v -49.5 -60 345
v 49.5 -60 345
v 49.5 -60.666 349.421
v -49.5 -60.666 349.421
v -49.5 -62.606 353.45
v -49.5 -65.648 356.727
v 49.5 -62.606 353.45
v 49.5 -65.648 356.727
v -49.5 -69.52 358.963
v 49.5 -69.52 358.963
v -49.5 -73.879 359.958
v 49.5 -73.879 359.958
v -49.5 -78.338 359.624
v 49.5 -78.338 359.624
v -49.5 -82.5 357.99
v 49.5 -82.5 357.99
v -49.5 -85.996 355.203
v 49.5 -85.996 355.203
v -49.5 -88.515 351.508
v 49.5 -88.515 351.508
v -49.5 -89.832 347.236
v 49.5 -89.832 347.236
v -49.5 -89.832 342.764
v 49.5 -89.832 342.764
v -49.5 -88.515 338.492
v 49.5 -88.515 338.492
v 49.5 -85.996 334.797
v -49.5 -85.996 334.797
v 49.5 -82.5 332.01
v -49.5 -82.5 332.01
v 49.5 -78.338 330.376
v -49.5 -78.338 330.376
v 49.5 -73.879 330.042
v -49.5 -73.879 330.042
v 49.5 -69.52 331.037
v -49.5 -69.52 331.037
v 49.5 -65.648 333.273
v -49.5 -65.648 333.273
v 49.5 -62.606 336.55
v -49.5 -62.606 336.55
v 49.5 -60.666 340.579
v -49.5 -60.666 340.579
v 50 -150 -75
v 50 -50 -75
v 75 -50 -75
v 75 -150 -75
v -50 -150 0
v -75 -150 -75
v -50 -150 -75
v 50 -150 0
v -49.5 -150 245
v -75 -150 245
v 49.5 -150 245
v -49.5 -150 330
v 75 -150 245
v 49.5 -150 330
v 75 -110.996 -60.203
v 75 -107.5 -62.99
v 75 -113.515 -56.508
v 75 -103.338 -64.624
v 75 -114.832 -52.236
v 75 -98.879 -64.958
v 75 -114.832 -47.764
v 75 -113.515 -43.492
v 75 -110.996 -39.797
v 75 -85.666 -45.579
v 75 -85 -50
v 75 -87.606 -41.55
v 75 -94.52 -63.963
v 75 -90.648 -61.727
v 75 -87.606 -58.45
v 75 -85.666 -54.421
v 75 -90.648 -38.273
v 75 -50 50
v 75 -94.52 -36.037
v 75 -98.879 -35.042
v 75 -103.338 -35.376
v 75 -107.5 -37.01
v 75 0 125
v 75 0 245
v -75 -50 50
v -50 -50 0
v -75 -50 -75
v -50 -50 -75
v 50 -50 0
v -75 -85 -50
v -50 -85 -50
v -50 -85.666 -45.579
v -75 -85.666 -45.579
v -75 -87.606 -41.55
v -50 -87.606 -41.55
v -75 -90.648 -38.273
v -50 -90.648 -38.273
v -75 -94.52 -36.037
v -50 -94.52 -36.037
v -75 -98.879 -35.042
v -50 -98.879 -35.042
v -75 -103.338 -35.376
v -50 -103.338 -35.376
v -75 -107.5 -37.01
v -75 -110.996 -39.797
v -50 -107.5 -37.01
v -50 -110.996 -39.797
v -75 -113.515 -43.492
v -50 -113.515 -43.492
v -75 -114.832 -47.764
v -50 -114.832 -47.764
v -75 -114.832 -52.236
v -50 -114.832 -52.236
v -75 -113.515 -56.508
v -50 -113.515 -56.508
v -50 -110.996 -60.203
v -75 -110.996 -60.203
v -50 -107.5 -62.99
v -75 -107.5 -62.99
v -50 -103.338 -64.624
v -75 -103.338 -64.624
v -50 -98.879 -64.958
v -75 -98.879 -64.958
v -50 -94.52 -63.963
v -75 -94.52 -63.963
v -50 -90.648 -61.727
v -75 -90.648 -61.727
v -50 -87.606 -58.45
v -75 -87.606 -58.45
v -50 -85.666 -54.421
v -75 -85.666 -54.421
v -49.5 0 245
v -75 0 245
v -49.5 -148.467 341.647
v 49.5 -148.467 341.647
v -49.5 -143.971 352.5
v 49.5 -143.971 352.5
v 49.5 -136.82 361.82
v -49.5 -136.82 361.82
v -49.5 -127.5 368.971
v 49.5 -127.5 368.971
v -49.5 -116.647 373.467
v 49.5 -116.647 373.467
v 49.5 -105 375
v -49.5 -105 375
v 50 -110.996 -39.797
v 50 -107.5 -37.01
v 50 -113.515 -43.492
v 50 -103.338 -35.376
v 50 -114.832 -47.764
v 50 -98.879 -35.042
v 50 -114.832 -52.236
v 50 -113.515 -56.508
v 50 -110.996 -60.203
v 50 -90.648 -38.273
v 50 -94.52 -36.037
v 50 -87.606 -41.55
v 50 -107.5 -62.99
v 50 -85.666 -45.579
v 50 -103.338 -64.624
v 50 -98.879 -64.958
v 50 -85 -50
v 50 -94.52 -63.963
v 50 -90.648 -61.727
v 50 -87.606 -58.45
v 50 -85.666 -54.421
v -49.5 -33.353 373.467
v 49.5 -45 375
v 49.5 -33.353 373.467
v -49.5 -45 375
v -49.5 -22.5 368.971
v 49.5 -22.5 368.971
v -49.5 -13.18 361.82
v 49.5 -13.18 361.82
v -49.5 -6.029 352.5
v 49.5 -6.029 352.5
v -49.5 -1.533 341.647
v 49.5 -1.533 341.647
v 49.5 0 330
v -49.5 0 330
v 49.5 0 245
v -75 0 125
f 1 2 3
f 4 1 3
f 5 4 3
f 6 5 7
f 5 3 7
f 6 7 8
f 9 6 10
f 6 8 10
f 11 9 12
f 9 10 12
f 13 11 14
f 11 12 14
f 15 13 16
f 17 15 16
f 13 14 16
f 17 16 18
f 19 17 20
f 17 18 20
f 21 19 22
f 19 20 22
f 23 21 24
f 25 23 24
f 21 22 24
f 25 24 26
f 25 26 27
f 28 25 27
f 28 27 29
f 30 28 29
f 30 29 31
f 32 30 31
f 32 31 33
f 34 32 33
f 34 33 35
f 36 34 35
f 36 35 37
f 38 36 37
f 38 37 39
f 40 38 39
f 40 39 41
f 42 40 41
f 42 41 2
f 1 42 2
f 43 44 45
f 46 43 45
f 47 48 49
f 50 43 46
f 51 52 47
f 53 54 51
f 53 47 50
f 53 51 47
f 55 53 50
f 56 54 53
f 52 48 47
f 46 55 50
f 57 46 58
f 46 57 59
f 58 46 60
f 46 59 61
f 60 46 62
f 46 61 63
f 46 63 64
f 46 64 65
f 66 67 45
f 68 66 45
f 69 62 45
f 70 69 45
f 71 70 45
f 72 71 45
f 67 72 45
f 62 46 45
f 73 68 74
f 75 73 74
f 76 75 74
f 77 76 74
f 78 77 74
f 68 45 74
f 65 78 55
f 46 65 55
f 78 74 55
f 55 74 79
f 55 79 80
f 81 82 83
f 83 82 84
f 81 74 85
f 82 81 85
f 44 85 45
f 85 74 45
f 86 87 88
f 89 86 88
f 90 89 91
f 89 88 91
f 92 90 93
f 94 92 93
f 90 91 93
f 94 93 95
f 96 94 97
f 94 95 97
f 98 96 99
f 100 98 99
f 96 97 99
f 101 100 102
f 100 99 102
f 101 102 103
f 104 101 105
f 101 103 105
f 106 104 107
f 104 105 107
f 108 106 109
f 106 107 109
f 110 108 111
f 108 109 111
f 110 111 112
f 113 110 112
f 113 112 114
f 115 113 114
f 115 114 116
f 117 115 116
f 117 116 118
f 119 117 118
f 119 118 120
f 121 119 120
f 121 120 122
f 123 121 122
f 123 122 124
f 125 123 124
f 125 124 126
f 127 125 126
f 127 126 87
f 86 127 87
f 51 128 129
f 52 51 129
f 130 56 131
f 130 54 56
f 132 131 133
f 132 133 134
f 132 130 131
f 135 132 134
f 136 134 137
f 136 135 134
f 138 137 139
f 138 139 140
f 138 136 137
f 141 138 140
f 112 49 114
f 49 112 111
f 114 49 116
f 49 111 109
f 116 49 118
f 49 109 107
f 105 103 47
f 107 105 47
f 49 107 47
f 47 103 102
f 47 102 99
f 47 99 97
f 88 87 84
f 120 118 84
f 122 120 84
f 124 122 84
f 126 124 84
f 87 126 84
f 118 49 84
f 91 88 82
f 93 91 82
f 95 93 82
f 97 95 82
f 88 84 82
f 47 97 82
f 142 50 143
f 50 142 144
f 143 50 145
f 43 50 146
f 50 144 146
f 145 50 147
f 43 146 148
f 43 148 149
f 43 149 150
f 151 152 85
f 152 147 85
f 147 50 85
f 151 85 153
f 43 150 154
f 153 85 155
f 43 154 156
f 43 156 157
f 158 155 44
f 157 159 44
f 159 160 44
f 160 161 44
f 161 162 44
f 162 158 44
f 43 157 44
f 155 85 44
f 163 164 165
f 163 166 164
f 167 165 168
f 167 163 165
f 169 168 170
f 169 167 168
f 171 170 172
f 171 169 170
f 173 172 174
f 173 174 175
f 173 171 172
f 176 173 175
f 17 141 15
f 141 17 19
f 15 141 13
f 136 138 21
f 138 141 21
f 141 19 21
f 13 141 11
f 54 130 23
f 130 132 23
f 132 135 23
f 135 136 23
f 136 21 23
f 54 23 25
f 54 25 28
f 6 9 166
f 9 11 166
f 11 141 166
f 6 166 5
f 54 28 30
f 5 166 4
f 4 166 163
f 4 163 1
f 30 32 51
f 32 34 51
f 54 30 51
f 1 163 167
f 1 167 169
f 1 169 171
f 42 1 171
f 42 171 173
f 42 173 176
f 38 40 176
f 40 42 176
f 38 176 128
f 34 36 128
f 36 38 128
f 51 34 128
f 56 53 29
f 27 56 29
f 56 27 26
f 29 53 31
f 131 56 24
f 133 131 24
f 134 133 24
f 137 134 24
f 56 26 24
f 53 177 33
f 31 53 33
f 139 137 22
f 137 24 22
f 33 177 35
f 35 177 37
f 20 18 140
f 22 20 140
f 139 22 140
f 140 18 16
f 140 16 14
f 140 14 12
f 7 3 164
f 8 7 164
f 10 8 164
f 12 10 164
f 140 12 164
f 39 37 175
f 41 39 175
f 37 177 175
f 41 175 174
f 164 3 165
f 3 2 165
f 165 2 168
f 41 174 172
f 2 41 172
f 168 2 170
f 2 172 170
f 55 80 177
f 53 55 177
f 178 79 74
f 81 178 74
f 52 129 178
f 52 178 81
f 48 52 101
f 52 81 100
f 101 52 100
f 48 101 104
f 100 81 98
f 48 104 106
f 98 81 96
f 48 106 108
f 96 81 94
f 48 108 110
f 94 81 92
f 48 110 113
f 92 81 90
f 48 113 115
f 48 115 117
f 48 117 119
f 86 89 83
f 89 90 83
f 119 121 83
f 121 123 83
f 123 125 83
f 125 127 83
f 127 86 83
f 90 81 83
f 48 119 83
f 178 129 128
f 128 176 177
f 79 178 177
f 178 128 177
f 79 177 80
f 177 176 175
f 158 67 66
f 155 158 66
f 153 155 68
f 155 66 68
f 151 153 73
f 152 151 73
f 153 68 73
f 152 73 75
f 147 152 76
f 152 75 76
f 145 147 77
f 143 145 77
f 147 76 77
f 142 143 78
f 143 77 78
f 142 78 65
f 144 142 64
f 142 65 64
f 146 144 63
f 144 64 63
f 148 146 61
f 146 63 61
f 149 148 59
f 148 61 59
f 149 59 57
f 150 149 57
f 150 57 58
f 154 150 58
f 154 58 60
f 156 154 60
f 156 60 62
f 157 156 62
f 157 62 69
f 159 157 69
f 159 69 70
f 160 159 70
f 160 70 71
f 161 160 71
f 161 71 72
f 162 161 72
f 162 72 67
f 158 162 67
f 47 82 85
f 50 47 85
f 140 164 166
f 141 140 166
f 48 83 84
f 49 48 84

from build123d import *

# Parameters (mm, degrees)
F1_DEPTH = 150
F3_DEPTH = 188
F4_R     = 45
F5_R     = 15
F6_DEPTH = 133
F7_R     = 15
F8_DEPTH = 179


with BuildPart() as f1:
    # F0 (on Front) → F1 (new body)
    with BuildSketch(Plane.XZ):
        Polygon((-50, 0), (0, 0), (50, 0), (50, -75), (75, -75), (75, 245), (49.5, 245), (49.5, 375), (-49.5, 375), (-49.5, 245), (-75, 245), (-75, -75), (-50, -75), align=None)
    extrude(amount=F1_DEPTH)

    # F2 (on face) → F3 (cut)
    with BuildSketch(Plane.YZ.offset(75)):
        Polygon((-50, 50), (-50, -75), (0, -75), (0, 125), align=None)
    extrude(amount=-F3_DEPTH, mode=Mode.SUBTRACT)

    # F4
    f4_edges = [f1.edges().sort_by_distance(p)[0] for p in [
        (0, -150, 375),
        (0, 0, 375),
    ]]
    fillet(f4_edges, radius=F4_R)

    # F5 (on face) → F6 (cut)
    with BuildSketch(Plane.YZ.offset(49.5)):
        with Locations((-75, 345)):
            Circle(F5_R)
    extrude(amount=-F6_DEPTH, mode=Mode.SUBTRACT)

    # F7 (on face) → F8 (cut)
    with BuildSketch(Plane.YZ.offset(75)):
        with Locations((-100, -50)):
            Circle(F7_R)
    extrude(amount=-F8_DEPTH, mode=Mode.SUBTRACT)


solid = f1.part
